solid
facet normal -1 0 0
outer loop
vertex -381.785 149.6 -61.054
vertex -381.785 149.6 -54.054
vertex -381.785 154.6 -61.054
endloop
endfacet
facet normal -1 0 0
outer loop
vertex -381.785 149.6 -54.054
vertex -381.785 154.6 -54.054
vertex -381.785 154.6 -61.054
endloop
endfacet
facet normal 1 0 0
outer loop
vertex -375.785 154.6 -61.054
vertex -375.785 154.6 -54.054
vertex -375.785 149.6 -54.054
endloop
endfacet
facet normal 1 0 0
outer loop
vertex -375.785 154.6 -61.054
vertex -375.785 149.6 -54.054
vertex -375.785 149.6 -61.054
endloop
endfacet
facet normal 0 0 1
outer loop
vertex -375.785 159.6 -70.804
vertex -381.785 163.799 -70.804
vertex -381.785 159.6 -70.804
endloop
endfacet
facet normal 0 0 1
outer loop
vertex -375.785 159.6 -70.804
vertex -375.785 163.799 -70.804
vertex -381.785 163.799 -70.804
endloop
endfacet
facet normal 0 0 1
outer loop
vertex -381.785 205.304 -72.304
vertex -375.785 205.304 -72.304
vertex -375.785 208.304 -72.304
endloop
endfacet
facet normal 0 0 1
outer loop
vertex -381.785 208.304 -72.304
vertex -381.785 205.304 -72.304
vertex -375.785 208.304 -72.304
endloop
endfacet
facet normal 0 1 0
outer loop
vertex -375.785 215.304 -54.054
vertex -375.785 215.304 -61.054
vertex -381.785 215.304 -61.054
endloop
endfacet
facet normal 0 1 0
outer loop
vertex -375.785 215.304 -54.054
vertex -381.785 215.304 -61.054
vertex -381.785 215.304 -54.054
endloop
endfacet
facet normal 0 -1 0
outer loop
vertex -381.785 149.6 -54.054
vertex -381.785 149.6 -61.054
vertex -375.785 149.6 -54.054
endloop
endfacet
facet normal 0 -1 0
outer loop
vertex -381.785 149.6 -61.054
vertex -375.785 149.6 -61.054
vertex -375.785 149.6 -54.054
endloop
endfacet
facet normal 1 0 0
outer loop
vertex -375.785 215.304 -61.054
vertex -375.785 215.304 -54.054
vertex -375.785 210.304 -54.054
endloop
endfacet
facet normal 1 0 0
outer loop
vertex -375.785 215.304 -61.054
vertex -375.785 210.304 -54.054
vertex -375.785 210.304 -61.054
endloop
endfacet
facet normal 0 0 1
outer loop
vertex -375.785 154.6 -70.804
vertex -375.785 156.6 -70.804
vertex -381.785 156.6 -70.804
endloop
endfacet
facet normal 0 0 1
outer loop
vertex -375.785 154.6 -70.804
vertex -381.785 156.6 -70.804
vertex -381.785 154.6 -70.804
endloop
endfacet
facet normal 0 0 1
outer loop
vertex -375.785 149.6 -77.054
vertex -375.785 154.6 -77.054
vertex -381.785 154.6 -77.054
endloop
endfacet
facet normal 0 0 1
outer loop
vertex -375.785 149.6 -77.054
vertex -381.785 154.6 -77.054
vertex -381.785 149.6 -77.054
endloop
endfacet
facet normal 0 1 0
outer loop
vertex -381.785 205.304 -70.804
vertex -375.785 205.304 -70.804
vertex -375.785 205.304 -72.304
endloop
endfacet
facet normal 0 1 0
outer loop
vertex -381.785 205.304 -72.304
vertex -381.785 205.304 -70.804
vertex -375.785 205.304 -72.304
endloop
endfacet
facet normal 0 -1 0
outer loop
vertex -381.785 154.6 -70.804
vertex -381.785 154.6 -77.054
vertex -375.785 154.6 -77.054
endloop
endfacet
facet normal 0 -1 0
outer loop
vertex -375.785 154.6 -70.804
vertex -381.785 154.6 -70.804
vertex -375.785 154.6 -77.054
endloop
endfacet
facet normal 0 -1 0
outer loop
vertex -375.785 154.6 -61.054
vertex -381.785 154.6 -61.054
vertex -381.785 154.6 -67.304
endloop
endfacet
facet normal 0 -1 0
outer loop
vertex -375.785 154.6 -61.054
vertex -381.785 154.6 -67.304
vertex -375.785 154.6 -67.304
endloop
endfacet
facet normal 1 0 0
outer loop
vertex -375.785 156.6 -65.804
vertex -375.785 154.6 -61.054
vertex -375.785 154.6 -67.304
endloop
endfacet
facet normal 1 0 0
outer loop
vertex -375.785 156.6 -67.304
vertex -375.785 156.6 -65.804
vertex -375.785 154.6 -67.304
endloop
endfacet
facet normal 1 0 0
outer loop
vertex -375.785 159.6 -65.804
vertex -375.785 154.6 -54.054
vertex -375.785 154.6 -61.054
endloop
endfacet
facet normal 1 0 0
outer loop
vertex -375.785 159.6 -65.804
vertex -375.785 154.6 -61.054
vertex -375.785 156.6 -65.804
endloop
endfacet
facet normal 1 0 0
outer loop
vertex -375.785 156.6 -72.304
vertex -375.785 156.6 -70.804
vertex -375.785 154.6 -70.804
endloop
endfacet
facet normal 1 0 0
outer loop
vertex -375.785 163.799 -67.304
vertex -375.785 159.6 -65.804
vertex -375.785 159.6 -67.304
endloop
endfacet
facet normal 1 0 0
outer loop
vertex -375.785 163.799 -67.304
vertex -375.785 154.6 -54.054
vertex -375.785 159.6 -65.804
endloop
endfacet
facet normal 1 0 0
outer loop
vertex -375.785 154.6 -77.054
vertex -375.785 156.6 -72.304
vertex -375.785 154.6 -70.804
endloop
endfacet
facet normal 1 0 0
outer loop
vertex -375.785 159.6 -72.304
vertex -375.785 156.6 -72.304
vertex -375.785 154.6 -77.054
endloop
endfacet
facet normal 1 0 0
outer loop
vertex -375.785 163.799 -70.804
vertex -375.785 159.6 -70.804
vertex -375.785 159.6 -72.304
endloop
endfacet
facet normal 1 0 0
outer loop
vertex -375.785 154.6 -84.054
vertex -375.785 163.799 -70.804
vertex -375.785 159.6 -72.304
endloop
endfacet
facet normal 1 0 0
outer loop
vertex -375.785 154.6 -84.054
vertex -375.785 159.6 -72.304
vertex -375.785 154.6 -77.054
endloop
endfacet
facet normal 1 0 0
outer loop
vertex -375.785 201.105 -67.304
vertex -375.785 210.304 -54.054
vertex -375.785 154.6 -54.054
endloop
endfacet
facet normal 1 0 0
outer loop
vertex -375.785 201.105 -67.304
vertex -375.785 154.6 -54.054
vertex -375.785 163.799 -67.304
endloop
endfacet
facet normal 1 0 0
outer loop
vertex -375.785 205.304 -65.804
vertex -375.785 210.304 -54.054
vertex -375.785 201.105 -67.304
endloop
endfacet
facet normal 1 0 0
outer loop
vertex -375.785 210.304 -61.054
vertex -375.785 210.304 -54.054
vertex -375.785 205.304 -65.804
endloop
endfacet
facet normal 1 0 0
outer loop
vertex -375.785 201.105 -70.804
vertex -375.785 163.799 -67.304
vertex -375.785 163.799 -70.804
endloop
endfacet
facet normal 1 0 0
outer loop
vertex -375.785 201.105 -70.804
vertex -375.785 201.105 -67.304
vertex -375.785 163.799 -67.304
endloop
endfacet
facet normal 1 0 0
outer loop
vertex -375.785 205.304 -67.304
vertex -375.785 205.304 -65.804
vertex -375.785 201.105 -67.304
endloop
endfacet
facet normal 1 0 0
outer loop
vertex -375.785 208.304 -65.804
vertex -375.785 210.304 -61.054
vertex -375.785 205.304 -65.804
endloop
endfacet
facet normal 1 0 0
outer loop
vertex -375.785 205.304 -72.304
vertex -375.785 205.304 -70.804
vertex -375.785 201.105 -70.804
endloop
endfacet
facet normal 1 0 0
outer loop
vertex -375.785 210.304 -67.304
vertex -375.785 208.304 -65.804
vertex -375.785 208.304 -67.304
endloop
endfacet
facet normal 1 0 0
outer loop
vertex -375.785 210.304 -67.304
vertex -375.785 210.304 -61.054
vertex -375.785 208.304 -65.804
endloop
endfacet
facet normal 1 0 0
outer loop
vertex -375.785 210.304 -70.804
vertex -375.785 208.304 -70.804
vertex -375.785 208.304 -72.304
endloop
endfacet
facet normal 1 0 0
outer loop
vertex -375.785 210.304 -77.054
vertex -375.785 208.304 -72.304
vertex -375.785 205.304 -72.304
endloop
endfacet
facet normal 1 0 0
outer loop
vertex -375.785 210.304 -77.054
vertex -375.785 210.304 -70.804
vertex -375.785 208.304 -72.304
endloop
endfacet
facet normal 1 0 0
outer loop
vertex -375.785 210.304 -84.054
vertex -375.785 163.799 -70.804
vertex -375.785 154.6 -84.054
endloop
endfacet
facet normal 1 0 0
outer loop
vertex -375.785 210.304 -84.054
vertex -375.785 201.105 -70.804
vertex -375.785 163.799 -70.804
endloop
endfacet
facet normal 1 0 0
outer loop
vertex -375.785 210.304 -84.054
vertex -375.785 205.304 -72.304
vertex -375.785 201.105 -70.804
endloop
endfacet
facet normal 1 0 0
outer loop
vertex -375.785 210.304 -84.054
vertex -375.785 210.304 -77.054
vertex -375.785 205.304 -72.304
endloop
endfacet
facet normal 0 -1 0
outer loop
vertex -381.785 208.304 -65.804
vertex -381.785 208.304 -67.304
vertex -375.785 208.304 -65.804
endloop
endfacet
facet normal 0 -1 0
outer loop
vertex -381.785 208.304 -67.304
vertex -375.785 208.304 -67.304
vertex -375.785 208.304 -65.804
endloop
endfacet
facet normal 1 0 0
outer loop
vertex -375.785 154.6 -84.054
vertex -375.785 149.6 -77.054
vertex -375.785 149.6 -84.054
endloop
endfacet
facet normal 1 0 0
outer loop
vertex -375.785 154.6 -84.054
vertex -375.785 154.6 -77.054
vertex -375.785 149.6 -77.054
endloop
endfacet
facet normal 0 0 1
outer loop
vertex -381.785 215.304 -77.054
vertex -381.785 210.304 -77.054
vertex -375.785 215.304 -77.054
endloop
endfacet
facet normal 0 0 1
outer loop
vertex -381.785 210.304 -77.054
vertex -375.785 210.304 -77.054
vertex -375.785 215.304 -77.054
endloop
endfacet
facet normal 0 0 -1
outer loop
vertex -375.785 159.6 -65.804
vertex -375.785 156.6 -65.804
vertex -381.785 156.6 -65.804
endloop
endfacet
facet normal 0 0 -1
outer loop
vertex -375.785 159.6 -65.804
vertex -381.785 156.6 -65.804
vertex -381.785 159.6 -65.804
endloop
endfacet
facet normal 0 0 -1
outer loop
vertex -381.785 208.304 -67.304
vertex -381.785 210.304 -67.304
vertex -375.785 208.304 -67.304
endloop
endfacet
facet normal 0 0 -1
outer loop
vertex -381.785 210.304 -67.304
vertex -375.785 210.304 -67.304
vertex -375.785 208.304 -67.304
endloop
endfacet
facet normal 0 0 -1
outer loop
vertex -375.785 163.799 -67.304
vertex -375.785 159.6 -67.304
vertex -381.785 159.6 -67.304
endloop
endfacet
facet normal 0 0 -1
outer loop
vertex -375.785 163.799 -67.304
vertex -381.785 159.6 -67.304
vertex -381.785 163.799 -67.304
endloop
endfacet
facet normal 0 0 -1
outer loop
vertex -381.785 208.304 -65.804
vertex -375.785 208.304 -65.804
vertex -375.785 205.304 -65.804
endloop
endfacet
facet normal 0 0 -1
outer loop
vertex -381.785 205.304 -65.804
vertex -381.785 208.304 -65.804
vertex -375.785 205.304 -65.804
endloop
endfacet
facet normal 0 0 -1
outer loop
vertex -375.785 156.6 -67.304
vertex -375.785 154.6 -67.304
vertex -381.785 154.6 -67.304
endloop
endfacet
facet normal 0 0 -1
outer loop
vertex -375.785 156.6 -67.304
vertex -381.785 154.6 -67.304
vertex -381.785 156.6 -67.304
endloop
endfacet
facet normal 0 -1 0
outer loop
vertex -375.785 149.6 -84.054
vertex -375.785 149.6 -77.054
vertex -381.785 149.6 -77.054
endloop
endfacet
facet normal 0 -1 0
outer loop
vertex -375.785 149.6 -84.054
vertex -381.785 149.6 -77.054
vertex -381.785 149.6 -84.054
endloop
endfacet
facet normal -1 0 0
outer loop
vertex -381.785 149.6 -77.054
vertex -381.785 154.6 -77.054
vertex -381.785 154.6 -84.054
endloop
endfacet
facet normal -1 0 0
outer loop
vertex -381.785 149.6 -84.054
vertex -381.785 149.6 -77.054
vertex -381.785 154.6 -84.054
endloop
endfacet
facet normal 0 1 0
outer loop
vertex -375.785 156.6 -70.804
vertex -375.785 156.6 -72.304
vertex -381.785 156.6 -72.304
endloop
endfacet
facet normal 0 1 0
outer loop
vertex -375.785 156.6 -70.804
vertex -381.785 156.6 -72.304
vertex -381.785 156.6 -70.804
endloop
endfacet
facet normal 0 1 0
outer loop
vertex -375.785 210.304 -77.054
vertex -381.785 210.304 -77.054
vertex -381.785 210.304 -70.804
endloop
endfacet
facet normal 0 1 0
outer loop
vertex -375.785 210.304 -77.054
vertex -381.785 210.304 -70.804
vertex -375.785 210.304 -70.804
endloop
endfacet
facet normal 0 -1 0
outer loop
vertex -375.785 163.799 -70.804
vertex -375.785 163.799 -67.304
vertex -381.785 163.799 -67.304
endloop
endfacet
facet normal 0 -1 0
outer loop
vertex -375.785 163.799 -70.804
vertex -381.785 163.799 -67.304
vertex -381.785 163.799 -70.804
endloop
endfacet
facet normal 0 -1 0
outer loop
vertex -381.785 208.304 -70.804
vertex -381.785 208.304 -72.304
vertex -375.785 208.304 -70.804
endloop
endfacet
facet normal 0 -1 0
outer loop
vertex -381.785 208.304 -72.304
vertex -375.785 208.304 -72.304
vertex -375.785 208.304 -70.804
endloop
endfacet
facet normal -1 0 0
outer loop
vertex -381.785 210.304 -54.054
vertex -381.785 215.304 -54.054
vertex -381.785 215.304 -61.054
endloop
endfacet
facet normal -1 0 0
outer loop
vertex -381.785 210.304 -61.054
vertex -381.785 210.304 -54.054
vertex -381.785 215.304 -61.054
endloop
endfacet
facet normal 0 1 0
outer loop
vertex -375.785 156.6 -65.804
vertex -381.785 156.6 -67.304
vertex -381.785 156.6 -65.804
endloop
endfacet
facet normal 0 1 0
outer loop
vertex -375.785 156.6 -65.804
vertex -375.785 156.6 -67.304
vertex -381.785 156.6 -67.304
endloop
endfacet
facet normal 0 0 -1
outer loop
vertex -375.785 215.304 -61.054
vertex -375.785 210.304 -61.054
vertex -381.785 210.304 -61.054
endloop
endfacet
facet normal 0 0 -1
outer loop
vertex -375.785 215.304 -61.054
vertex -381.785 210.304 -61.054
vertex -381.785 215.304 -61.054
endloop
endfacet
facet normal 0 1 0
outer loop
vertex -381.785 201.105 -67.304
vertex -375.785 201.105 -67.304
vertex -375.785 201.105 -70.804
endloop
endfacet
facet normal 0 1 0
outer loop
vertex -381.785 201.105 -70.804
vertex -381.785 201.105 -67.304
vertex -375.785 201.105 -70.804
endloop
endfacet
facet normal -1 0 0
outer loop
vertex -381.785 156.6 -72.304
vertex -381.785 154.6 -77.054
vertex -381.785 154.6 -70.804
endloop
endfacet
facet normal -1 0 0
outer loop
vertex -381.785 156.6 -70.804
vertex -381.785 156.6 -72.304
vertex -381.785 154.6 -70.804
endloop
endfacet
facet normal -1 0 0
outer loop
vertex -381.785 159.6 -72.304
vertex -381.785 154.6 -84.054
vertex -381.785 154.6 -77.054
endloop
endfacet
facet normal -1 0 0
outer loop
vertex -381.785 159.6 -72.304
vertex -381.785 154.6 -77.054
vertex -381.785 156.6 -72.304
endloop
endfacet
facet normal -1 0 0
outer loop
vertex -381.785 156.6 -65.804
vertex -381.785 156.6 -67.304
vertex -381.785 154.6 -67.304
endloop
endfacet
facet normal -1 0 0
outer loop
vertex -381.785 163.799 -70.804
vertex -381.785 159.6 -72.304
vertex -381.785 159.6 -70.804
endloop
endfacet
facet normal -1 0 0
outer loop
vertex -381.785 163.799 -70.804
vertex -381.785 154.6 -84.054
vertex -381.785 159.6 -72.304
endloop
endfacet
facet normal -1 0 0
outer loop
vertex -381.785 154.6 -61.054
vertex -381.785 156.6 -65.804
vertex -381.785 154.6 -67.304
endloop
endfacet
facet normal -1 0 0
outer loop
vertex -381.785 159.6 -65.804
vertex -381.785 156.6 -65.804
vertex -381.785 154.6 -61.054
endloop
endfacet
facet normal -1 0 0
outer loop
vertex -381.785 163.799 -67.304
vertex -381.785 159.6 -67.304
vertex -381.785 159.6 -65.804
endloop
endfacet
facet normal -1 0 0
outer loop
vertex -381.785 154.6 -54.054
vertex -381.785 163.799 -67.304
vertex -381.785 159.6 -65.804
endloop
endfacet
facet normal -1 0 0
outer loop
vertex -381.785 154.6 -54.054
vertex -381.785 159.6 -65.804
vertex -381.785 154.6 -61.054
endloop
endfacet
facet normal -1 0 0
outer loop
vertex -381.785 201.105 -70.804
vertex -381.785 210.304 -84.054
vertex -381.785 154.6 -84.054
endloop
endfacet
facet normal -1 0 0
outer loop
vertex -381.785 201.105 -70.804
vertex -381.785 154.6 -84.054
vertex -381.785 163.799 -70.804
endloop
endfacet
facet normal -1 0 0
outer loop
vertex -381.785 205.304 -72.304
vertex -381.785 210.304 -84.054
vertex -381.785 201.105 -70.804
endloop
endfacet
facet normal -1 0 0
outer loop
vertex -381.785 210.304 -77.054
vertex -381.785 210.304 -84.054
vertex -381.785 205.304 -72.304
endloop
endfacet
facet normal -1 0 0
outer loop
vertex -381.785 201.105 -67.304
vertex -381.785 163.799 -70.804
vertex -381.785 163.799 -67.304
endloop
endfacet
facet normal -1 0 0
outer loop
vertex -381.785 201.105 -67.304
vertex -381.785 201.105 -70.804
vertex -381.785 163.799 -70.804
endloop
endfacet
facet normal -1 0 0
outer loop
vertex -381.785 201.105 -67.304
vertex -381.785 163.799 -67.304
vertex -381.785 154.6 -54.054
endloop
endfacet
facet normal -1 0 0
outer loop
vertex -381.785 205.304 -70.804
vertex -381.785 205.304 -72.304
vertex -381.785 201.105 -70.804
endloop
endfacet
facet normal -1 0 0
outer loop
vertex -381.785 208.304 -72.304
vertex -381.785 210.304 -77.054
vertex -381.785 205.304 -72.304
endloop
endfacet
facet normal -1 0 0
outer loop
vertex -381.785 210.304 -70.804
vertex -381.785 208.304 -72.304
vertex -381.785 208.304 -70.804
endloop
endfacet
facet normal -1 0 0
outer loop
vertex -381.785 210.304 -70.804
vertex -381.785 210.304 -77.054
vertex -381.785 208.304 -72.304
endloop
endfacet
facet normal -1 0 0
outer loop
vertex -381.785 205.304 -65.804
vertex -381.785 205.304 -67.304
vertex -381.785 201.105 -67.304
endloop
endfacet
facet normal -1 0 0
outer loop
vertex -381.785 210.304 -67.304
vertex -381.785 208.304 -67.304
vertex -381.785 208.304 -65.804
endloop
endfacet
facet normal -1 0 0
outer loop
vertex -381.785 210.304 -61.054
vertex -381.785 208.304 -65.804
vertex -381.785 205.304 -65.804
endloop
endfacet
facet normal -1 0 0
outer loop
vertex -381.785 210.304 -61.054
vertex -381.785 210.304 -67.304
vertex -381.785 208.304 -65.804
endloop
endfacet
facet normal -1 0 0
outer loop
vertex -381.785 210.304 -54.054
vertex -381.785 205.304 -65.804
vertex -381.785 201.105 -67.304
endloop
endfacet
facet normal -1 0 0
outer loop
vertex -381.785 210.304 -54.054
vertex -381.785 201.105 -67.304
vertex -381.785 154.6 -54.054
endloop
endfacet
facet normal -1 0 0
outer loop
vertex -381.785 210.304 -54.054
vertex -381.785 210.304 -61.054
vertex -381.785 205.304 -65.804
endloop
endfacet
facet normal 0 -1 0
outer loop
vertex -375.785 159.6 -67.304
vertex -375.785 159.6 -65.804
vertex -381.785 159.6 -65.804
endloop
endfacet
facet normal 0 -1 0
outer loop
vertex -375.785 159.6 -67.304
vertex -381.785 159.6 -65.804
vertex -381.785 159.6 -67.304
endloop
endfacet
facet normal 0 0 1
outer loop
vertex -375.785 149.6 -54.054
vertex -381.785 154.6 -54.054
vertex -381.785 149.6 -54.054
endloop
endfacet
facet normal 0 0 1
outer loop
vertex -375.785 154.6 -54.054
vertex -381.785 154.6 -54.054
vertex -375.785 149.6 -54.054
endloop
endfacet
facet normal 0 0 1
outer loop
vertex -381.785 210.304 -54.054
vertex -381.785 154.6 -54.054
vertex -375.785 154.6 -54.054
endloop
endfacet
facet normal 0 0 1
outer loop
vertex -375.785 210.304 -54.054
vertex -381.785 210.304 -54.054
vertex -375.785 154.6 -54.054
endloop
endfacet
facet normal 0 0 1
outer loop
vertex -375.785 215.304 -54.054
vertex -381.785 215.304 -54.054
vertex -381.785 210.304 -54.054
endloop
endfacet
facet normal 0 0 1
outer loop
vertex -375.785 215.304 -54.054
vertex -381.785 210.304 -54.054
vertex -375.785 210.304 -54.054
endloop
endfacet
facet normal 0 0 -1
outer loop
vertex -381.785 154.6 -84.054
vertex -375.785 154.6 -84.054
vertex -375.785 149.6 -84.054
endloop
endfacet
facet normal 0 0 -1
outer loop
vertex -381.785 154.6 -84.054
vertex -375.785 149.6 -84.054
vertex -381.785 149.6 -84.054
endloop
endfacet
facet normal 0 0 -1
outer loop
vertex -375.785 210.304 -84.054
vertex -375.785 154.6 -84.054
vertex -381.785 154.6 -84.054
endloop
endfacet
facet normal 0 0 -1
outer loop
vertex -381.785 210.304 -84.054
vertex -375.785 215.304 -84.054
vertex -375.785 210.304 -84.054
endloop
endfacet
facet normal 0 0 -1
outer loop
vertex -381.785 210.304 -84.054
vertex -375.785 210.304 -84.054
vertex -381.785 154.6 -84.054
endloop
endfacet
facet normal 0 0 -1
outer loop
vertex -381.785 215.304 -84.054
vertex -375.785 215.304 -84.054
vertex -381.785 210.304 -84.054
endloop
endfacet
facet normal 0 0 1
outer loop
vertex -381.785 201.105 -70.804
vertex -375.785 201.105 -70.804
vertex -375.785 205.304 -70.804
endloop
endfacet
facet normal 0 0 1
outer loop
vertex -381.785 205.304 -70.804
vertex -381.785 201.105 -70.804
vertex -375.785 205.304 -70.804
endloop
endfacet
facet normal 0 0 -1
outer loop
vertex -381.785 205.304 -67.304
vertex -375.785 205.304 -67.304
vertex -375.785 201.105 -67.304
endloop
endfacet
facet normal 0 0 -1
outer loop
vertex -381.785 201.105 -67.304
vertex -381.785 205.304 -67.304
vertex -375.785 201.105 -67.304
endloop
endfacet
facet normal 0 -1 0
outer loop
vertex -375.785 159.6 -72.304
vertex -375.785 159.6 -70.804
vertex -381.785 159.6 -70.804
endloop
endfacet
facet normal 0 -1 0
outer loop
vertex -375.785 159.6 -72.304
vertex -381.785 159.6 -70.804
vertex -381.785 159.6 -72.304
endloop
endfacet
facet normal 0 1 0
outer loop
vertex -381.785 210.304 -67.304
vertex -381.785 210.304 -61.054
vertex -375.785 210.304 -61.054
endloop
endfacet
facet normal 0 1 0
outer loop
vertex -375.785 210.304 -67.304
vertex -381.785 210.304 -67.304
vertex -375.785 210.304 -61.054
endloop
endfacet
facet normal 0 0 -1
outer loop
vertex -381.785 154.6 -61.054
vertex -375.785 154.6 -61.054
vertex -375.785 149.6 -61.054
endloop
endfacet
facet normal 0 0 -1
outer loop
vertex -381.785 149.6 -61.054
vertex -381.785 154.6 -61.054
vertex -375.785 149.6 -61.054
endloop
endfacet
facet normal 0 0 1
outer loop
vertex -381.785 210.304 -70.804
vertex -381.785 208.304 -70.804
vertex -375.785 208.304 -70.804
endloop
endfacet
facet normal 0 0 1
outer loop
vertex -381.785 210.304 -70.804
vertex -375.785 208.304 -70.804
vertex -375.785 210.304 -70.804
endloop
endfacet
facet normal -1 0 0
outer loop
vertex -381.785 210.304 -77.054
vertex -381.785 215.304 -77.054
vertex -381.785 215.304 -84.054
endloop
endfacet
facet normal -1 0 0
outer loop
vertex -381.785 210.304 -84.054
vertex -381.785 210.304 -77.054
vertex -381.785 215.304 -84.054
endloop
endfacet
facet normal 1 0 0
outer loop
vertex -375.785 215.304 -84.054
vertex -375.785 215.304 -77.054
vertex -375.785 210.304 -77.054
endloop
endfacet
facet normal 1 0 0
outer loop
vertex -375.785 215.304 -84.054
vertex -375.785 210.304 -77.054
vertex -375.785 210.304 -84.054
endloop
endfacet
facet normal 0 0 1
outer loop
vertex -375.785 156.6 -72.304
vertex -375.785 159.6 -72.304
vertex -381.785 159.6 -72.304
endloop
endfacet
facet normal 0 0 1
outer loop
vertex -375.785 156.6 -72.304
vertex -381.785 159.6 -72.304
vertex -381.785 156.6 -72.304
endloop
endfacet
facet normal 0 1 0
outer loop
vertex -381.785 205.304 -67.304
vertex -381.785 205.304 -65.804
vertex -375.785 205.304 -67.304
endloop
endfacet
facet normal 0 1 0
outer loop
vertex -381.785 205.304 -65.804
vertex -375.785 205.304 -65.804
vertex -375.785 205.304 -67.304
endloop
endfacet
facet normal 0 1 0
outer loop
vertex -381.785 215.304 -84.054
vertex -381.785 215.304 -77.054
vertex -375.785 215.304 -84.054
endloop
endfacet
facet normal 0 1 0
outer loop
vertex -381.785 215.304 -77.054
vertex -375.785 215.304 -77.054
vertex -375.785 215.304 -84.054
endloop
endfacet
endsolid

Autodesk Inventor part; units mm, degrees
ref_plane "YZ Plane" through (0, 0, 0) normal (1, 0, 0) x (0, 1, 0)
ref_plane "XZ Plane" through (0, 0, 0) normal (0, 1, 0) x (-1, 0, 0)
ref_plane "РабПлоскость1" through (-329.2239, 210.3045, -11.0538) normal (0, -1, 0) x (1, 0, 0)
sketch "Эскиз1" plane through (-329.2239, 210.3045, -11.0538) normal (0, -1, 0) x (1, 0, 0)
  line L0 (-46.5606, -73) -> (-52.5606, -73)
  line L1 (-52.5606, -73) -> (-52.5606, -43)
  line L2 (-52.5606, -43) -> (-46.5606, -43)
  line L3 (-46.5606, -43) -> (-46.5606, -73)
  line L4 (-23.55, -78) -> (-51.55, -78) projected
  point P0 (329.2239, 11.0538)
  dimension "d0" = 6
  dimension "d1" = 30
  dimension "d2" = 5
ref_plane "РабПлоскость2" through (-464.2239, 154.5996, -124.0538) normal (0, 1, 0) x (0, 0, 1)
extrude "Выдавливание1" add sketch "Эскиз1" along normal up to surface (55.705 mm away)
sketch "Эскиз2" plane through (-375.7846, 210.3045, -54.0538) normal (1, 0, 0) x (0, 0, -1)
  line L0 (0, -55.705) -> (30, -55.705) projected
  line L1 (30, -55.705) -> (23, -55.705)
  line L2 (23, -55.705) -> (23, -60.705)
  line L3 (23, -60.705) -> (30, -60.705)
  line L4 (30, -60.705) -> (30, -55.705)
  line L5 (0, -55.705) -> (7, -55.705)
  line L6 (7, -55.705) -> (7, -60.705)
  line L7 (7, -60.705) -> (0, -60.705)
  line L8 (0, -60.705) -> (0, -55.705)
  line L9 (18.25, -53.705) -> (11.75, -53.705)
  line L10 (11.75, -53.705) -> (11.75, -50.705)
  line L11 (11.75, -50.705) -> (18.25, -50.705)
  line L12 (18.25, -50.705) -> (18.25, -53.705)
  line L13 (13.25, -46.5052) -> (16.75, -46.5052)
  line L14 (16.75, -46.5052) -> (16.75, -57.9047)
  line L15 (16.75, -57.9047) -> (13.25, -57.9047)
  line L16 (13.25, -57.9047) -> (13.25, -46.5052)
  line L17 (13.25, -46.5052) -> (16.75, -57.9047) construction
  line L18 (16.75, -46.5052) -> (13.25, -57.9047) construction
  line L19 (30, 0) -> (30, -55.705) projected
  line L20 (30, -27.8525) -> (0, -27.8525)
  line L21 (0, 0) -> (0, -55.705) projected
  line L22 (30, 0) -> (23, 0)
  line L23 (23, 0) -> (23, 5)
  line L24 (23, 5) -> (30, 5)
  line L25 (30, 5) -> (30, 0)
  line L26 (0, 0) -> (7, 0)
  line L27 (7, 0) -> (7, 5)
  line L28 (7, 5) -> (0, 5)
  line L29 (0, 5) -> (0, 0)
  line L30 (18.25, -2) -> (11.75, -2)
  line L31 (11.75, -2) -> (11.75, -5)
  line L32 (11.75, -5) -> (18.25, -5)
  line L33 (18.25, -5) -> (18.25, -2)
  line L34 (13.25, -9.1998) -> (16.75, -9.1998)
  line L35 (16.75, -9.1998) -> (16.75, 2.1998)
  line L36 (16.75, 2.1998) -> (13.25, 2.1998)
  line L37 (13.25, 2.1998) -> (13.25, -9.1998)
  line L38 (13.25, -9.1998) -> (16.75, 2.1998) construction
  line L39 (16.75, -9.1998) -> (13.25, 2.1998) construction
  point P0 (-54.0538, -210.3045)
  point P1 (15, -52.205)
  point P2 (7, -55.705)
  point P3 (23, -55.705)
  point P4 (16.75, -53.705)
  point P5 (16.75, -50.705)
  point P6 (13.25, -50.705)
  point P7 (13.25, -53.705)
  point P8 (15, -3.5)
  point P9 (16.75, -5)
  point P10 (16.75, -2)
  point P11 (13.25, -2)
  point P12 (13.25, -5)
  dimension "d2" = 5
  dimension "d13" = 6.5
  dimension "d14" = 3
  dimension "d15" = 5
  dimension "d16" = 7
  dimension "d17" = 4.75
  dimension "d18" = 2
  dimension "d19" = 3.5
  dimension "d20" = 3.25
  dimension "d23" = 5
  dimension "d24" = 7
  dimension "d25" = 7
extrude "Выдавливание2" add sketch "Эскиз2" against normal blind 6 contours L0 L6 L7 L8 | L4 L3 L2 L0 | L22 L23 L24 L25 | L29 L28 L27 L26
sketch "Эскиз3" plane through (-375.7846, 154.5996, -84.0538) normal (1, 0, 0) x (0, 0, -1)
  point P0 (-84.0538, -154.5996)
extrude "Выдавливание3" cut sketch "Эскиз2" against normal blind 6 contours L16 L9 L14 L0 | L0 L14 L15 L16 | L16 L11 L14 L9 | L9 L10 L11 L16 | L14 L11 L12 L9 | L16 L13 L14 L11 | L33 L32 L35 L30 | L35 L32 L37 L30 | L30 L37 L36 L35 | L37 L32 L31 L30 | L35 L34 L37 L32
properties part number "стенка 2"
